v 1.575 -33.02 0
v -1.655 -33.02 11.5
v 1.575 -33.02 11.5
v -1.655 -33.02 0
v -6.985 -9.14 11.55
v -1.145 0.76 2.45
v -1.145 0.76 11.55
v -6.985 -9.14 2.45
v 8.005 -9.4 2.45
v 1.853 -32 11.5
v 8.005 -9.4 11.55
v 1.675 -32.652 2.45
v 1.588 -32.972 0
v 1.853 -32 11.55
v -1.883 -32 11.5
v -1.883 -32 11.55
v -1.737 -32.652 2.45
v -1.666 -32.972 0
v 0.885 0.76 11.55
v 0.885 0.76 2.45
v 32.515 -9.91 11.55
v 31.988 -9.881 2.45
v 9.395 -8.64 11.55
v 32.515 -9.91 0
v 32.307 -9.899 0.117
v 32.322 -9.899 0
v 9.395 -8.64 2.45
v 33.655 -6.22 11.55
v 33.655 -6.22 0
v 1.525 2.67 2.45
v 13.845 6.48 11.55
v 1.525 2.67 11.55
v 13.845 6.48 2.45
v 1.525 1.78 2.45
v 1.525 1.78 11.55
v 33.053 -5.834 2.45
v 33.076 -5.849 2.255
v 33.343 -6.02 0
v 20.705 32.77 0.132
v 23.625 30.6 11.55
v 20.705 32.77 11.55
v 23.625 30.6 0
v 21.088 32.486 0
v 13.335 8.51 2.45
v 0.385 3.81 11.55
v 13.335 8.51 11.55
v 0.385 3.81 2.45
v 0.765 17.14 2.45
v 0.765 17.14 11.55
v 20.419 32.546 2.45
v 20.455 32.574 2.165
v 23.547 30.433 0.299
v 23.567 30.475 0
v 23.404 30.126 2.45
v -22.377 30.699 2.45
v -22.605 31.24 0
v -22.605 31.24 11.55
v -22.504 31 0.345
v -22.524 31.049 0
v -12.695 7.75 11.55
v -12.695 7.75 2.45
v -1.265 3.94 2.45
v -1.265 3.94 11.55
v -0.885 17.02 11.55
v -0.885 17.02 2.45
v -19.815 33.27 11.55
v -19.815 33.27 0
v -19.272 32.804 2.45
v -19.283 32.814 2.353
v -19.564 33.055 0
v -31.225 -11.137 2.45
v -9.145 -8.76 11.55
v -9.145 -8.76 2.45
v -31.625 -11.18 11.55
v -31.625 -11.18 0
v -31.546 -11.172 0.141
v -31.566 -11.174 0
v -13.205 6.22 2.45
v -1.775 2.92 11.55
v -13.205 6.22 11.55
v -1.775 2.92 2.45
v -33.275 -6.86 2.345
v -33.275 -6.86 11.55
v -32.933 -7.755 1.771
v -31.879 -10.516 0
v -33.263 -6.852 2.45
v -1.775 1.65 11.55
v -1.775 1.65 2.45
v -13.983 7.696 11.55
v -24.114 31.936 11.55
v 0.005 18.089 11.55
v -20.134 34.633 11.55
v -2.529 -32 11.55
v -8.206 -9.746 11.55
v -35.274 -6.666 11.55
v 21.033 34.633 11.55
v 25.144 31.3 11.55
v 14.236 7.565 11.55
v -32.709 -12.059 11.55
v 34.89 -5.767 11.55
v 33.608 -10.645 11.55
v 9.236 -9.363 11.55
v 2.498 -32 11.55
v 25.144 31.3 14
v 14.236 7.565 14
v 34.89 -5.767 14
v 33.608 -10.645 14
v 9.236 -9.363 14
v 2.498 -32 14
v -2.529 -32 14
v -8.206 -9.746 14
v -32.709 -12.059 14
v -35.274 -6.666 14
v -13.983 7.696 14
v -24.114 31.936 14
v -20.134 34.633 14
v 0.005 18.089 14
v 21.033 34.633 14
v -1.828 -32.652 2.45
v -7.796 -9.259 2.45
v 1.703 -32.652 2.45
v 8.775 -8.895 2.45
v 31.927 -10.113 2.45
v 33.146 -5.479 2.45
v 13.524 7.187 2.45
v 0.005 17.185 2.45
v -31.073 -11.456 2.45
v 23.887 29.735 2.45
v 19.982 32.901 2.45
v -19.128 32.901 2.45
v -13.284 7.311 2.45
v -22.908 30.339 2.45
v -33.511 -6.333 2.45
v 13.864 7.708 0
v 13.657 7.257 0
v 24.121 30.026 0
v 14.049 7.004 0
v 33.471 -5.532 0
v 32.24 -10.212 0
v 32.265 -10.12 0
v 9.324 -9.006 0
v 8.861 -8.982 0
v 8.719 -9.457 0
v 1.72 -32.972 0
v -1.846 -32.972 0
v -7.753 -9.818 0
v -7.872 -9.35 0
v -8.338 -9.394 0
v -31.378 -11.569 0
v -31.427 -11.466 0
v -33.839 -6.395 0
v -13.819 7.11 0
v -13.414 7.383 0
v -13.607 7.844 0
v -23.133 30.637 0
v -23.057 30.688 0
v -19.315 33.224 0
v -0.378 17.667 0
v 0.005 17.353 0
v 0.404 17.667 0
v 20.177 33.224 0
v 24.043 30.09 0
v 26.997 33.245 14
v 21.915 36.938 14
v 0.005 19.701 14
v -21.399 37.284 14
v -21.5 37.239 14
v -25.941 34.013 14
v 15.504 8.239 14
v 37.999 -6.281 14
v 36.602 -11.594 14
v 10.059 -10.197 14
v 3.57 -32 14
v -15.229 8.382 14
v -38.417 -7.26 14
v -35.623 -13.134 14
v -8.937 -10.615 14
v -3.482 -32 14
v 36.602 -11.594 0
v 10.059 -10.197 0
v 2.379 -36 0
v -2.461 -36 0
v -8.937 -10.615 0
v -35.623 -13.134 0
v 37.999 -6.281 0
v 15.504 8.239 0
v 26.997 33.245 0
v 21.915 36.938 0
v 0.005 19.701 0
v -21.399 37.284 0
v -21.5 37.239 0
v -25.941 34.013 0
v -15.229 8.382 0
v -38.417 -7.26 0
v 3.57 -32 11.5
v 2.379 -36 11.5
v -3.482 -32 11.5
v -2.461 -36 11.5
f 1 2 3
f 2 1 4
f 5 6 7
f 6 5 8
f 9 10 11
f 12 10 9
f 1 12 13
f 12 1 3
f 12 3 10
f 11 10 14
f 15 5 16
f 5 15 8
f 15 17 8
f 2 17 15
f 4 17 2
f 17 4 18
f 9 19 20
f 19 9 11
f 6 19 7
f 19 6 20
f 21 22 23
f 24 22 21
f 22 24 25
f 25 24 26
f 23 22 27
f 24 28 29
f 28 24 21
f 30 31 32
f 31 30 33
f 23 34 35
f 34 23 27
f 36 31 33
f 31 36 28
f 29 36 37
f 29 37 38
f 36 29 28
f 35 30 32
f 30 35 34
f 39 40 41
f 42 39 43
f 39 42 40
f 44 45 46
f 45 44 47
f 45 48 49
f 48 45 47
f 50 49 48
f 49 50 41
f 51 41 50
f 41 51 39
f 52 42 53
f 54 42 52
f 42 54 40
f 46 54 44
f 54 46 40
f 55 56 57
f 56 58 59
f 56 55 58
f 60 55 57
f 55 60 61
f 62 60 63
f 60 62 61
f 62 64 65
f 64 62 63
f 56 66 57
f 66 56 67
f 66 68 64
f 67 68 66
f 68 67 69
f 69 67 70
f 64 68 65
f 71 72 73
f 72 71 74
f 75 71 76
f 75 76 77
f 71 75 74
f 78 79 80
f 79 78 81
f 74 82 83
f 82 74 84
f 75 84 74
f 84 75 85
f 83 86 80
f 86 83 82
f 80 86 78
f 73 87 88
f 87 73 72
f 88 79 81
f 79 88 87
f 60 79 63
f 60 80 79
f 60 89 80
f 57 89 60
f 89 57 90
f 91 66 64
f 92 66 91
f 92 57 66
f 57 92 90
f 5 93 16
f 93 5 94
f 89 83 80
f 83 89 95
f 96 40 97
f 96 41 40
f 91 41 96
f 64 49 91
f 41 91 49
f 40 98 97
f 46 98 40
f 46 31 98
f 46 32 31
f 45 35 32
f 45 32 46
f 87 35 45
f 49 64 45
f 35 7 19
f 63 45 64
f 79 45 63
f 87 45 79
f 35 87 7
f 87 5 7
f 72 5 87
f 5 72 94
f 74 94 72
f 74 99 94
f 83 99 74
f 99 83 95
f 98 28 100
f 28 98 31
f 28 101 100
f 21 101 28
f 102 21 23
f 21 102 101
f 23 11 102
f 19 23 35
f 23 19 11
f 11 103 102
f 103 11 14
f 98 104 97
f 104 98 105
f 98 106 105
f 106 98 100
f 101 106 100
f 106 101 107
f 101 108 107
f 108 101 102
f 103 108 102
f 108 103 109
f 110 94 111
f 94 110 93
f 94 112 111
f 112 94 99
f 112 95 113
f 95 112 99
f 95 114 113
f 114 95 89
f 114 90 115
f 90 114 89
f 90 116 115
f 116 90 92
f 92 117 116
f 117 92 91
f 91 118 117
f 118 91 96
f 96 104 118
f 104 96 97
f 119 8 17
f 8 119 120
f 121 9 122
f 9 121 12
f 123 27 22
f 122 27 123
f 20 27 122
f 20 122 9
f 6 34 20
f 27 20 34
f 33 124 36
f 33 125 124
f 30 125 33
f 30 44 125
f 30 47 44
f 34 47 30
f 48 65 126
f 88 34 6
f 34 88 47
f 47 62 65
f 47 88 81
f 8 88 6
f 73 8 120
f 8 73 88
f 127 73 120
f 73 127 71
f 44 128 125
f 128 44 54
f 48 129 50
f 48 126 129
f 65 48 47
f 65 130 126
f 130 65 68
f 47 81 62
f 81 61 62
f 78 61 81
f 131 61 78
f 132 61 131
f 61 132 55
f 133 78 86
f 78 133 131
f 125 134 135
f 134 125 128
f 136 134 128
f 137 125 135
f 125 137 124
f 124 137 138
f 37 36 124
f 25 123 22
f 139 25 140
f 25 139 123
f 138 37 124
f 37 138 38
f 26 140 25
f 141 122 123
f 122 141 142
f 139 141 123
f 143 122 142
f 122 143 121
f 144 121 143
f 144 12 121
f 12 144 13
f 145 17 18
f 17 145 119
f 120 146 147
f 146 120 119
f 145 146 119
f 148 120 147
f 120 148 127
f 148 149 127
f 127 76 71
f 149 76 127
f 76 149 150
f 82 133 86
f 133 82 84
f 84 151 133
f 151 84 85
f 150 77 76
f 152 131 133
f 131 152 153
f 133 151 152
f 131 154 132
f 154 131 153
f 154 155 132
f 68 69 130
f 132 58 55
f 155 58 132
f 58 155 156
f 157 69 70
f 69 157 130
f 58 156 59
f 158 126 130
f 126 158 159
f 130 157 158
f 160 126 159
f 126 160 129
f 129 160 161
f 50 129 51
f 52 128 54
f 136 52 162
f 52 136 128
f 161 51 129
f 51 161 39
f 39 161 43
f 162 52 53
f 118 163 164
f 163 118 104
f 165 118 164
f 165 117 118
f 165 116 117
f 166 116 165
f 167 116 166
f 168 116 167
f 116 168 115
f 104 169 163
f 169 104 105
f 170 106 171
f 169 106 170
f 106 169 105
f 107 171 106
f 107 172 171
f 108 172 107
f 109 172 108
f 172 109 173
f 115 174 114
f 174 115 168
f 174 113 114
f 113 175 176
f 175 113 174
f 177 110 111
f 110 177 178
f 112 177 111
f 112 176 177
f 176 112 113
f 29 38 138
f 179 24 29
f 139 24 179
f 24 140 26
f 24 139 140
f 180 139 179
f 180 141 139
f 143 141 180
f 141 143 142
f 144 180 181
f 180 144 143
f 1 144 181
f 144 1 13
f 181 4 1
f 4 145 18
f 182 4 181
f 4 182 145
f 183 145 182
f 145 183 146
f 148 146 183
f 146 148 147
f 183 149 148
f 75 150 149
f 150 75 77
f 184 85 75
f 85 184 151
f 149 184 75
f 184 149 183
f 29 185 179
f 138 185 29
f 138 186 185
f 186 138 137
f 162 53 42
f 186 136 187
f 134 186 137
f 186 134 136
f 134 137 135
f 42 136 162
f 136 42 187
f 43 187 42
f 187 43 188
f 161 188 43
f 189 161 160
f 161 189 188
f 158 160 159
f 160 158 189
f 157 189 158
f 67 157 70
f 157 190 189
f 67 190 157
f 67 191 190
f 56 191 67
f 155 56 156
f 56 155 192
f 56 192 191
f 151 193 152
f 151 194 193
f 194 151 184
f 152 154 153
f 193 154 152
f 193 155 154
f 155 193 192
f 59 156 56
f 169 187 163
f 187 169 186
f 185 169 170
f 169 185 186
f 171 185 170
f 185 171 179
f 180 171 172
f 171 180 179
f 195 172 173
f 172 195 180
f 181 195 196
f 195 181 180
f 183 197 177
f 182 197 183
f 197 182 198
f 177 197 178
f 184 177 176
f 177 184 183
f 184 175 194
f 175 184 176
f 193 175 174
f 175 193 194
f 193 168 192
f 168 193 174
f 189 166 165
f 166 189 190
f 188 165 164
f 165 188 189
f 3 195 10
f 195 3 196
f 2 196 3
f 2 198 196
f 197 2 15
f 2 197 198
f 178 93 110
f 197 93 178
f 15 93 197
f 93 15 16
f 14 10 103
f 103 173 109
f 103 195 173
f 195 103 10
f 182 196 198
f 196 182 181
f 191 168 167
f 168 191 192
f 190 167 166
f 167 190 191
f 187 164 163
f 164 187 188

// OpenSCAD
refDepth = 14;
skinBreak = 0.05;

cX = 69.85 / 2;
cY = 68.58 / 2;

ztar = [
[33.02 -cX,68.32 -cY],
[36.70 -cX,68.32 -cY],
[44.07 -cX,43.56 -cY],
[68.20 -cX,44.83 -cY],
[69.47 -cX,40.00 -cY],
[49.02 -cX,26.80 -cY],
[59.82 -cX,3.30 -cY],
[55.75 -cX,0.00 -cY],
[34.93 -cX,16.38 -cY],
[14.99 -cX,0.00 -cY],
[11.05 -cX,2.67 -cY],
[21.08 -cX,26.67 -cY],
[0.00 -cX,40.89 -cY],
[2.54 -cX,46.23 -cY],
[26.80 -cX,43.94 -cY]];

bcX = 35.56;
bcY = 31.75;
xbarz = [
[33.02,33.02],
[24.13,44.45],
[26.67,44.45],
[34.29,33.02],
[35.56,33.02],
[43.18,44.45],
[44.45,43.18],
[36.83,33.02],
[36.83,30.48],
[49.53,27.94],
[49.53,25.40],
[36.83,30.48],
[35.56,30.48],
[35.56,16.51],
[34.29,15.24],
[34.29,30.48],
[33.02,30.48],
[20.32,25.40],
[20.32,27.94],
[33.02,31.75],
[33.02,33.02]
];


barzPoly = [
[33.02,32.51],
[24.64,44.20],
[27.18,44.70],
[33.40,33.91],
[36.32,33.91],
[43.69,44.20],
[44.83,43.56],
[37.47,34.04],
[37.47,30.99],
[49.91,27.43],
[49.40,25.65],
[37.33,29.72],
[35.31,29.72],
[35.43,16.13],
[34.16,16.13],
[34.29,29.60],
[31.37,29.72],
[20.57,25.40],
[20.07,27.69],
[32.26,30.99],
[32.26,33.66]
];

barzNeg = [
[ /* top */
[33.27,67.31],
[36.50,67.31],
[42.93,43.69],
[35.81,33.53],
[33.78,33.53],
[27.94,43.43] ],
[ /* right */
[44.32,42.93],
[67.44,44.20],
[68.58,40.51],
[48.77,27.81],
[36.45,31.62],
[36.45,32.51] ],
[ /* bot right */
[35.31,30.48],
[48.26,25.78],
[58.55,3.69],
[55.63,1.52],
[35.69,17.15]],
[ /* bot left */
[22.23,26.54],
[33.66,30.35],
[34.04,17.27],
[15.11,1.02],
[12.32,3.05]],
[ /* left */
[3.30,45.47],
[25.78,43.05],
[33.15,32.64],
[33.15,31.37],
[21.72,28.07],
[1.65,41.15]]

];

//    translate([-cX, -cY, 0])

module arms(d, sc=1) {
    rotate([180,0,0])
    translate([-cX, -cY, -d/2])
            linear_extrude(height = d, center=true, scale=sc)
                polygon(barzPoly);
}

module armsNeg(d, sc=1) {
    rotate([180,0,0])
        translate([-cX, -cY, -d/2-skinBreak]) {
            for (seg = barzNeg) {
                linear_extrude(height = d, center=true, scale=sc)
                    polygon(seg);
            }
        }
}


module star(d, sc = 1) {
    rotate([180,0,0])
    translate([0, 0, -d/2])
            linear_extrude(height = d, center=true, scale=sc)
                polygon(ztar);
}

module xstar(d, sc = 1, sc2) {
    rotate([180,0,0])
    translate([0, 0, -d/2])
        scale([sc2, sc2, 1])
            linear_extrude(height = d, center=true, scale=sc)
                polygon(ztar);
}

boardD = 2.5;

hW = 15;
hH = 15;
hD = boardD;
hX = -hW/2;
hY = -45;
hZ = refDepth - hD;
module casedStar() {
    union() {
    difference() {
        scale([1.1, 1.1, 1])
            star(refDepth);
        union() {
            // inner gap for board support
            translate([0, 0,refDepth +skinBreak-boardD])
                scale([1.01, 1.01, 1])
               star(boardD);
            // arm holes
            translate([0, 0, -skinBreak*2])
             armsNeg(refDepth);

            //reflector hole
         translate([0, 0, -skinBreak])
                scale([1.01, 1.01, 1])
#               xstar(boardD, 1.01, .95);

        }
    }
//    translate([0, 0, boardD])
//        arms(refDepth - boardD);
}
}

h2W = 15;
h2H = 10;
h2D = refDepth;
h2X = -h2W/2;
h2Y = -46;
h2Z = refDepth - h2D;

module frame() {
    difference() {
        casedStar();
        // space for mount to come off of top arm
        translate([hX, hY-2, hZ])
 #           cube([hW, hH, hD]);
        // clip off end of mounting arm
        translate([h2X, h2Y, h2Z-skinBreak])
           cube([h2W, h2H, h2D+skinBreak*2]);

    }
}

intersection() {
    frame();
    translate([0, 0, -5])
    cylinder(h=25, r=43);
}

//star();
/*
barH = 3;
translate([0, 0, 0])
    scale([1.05, 1.05, 1])
        arms(barH);
*/
